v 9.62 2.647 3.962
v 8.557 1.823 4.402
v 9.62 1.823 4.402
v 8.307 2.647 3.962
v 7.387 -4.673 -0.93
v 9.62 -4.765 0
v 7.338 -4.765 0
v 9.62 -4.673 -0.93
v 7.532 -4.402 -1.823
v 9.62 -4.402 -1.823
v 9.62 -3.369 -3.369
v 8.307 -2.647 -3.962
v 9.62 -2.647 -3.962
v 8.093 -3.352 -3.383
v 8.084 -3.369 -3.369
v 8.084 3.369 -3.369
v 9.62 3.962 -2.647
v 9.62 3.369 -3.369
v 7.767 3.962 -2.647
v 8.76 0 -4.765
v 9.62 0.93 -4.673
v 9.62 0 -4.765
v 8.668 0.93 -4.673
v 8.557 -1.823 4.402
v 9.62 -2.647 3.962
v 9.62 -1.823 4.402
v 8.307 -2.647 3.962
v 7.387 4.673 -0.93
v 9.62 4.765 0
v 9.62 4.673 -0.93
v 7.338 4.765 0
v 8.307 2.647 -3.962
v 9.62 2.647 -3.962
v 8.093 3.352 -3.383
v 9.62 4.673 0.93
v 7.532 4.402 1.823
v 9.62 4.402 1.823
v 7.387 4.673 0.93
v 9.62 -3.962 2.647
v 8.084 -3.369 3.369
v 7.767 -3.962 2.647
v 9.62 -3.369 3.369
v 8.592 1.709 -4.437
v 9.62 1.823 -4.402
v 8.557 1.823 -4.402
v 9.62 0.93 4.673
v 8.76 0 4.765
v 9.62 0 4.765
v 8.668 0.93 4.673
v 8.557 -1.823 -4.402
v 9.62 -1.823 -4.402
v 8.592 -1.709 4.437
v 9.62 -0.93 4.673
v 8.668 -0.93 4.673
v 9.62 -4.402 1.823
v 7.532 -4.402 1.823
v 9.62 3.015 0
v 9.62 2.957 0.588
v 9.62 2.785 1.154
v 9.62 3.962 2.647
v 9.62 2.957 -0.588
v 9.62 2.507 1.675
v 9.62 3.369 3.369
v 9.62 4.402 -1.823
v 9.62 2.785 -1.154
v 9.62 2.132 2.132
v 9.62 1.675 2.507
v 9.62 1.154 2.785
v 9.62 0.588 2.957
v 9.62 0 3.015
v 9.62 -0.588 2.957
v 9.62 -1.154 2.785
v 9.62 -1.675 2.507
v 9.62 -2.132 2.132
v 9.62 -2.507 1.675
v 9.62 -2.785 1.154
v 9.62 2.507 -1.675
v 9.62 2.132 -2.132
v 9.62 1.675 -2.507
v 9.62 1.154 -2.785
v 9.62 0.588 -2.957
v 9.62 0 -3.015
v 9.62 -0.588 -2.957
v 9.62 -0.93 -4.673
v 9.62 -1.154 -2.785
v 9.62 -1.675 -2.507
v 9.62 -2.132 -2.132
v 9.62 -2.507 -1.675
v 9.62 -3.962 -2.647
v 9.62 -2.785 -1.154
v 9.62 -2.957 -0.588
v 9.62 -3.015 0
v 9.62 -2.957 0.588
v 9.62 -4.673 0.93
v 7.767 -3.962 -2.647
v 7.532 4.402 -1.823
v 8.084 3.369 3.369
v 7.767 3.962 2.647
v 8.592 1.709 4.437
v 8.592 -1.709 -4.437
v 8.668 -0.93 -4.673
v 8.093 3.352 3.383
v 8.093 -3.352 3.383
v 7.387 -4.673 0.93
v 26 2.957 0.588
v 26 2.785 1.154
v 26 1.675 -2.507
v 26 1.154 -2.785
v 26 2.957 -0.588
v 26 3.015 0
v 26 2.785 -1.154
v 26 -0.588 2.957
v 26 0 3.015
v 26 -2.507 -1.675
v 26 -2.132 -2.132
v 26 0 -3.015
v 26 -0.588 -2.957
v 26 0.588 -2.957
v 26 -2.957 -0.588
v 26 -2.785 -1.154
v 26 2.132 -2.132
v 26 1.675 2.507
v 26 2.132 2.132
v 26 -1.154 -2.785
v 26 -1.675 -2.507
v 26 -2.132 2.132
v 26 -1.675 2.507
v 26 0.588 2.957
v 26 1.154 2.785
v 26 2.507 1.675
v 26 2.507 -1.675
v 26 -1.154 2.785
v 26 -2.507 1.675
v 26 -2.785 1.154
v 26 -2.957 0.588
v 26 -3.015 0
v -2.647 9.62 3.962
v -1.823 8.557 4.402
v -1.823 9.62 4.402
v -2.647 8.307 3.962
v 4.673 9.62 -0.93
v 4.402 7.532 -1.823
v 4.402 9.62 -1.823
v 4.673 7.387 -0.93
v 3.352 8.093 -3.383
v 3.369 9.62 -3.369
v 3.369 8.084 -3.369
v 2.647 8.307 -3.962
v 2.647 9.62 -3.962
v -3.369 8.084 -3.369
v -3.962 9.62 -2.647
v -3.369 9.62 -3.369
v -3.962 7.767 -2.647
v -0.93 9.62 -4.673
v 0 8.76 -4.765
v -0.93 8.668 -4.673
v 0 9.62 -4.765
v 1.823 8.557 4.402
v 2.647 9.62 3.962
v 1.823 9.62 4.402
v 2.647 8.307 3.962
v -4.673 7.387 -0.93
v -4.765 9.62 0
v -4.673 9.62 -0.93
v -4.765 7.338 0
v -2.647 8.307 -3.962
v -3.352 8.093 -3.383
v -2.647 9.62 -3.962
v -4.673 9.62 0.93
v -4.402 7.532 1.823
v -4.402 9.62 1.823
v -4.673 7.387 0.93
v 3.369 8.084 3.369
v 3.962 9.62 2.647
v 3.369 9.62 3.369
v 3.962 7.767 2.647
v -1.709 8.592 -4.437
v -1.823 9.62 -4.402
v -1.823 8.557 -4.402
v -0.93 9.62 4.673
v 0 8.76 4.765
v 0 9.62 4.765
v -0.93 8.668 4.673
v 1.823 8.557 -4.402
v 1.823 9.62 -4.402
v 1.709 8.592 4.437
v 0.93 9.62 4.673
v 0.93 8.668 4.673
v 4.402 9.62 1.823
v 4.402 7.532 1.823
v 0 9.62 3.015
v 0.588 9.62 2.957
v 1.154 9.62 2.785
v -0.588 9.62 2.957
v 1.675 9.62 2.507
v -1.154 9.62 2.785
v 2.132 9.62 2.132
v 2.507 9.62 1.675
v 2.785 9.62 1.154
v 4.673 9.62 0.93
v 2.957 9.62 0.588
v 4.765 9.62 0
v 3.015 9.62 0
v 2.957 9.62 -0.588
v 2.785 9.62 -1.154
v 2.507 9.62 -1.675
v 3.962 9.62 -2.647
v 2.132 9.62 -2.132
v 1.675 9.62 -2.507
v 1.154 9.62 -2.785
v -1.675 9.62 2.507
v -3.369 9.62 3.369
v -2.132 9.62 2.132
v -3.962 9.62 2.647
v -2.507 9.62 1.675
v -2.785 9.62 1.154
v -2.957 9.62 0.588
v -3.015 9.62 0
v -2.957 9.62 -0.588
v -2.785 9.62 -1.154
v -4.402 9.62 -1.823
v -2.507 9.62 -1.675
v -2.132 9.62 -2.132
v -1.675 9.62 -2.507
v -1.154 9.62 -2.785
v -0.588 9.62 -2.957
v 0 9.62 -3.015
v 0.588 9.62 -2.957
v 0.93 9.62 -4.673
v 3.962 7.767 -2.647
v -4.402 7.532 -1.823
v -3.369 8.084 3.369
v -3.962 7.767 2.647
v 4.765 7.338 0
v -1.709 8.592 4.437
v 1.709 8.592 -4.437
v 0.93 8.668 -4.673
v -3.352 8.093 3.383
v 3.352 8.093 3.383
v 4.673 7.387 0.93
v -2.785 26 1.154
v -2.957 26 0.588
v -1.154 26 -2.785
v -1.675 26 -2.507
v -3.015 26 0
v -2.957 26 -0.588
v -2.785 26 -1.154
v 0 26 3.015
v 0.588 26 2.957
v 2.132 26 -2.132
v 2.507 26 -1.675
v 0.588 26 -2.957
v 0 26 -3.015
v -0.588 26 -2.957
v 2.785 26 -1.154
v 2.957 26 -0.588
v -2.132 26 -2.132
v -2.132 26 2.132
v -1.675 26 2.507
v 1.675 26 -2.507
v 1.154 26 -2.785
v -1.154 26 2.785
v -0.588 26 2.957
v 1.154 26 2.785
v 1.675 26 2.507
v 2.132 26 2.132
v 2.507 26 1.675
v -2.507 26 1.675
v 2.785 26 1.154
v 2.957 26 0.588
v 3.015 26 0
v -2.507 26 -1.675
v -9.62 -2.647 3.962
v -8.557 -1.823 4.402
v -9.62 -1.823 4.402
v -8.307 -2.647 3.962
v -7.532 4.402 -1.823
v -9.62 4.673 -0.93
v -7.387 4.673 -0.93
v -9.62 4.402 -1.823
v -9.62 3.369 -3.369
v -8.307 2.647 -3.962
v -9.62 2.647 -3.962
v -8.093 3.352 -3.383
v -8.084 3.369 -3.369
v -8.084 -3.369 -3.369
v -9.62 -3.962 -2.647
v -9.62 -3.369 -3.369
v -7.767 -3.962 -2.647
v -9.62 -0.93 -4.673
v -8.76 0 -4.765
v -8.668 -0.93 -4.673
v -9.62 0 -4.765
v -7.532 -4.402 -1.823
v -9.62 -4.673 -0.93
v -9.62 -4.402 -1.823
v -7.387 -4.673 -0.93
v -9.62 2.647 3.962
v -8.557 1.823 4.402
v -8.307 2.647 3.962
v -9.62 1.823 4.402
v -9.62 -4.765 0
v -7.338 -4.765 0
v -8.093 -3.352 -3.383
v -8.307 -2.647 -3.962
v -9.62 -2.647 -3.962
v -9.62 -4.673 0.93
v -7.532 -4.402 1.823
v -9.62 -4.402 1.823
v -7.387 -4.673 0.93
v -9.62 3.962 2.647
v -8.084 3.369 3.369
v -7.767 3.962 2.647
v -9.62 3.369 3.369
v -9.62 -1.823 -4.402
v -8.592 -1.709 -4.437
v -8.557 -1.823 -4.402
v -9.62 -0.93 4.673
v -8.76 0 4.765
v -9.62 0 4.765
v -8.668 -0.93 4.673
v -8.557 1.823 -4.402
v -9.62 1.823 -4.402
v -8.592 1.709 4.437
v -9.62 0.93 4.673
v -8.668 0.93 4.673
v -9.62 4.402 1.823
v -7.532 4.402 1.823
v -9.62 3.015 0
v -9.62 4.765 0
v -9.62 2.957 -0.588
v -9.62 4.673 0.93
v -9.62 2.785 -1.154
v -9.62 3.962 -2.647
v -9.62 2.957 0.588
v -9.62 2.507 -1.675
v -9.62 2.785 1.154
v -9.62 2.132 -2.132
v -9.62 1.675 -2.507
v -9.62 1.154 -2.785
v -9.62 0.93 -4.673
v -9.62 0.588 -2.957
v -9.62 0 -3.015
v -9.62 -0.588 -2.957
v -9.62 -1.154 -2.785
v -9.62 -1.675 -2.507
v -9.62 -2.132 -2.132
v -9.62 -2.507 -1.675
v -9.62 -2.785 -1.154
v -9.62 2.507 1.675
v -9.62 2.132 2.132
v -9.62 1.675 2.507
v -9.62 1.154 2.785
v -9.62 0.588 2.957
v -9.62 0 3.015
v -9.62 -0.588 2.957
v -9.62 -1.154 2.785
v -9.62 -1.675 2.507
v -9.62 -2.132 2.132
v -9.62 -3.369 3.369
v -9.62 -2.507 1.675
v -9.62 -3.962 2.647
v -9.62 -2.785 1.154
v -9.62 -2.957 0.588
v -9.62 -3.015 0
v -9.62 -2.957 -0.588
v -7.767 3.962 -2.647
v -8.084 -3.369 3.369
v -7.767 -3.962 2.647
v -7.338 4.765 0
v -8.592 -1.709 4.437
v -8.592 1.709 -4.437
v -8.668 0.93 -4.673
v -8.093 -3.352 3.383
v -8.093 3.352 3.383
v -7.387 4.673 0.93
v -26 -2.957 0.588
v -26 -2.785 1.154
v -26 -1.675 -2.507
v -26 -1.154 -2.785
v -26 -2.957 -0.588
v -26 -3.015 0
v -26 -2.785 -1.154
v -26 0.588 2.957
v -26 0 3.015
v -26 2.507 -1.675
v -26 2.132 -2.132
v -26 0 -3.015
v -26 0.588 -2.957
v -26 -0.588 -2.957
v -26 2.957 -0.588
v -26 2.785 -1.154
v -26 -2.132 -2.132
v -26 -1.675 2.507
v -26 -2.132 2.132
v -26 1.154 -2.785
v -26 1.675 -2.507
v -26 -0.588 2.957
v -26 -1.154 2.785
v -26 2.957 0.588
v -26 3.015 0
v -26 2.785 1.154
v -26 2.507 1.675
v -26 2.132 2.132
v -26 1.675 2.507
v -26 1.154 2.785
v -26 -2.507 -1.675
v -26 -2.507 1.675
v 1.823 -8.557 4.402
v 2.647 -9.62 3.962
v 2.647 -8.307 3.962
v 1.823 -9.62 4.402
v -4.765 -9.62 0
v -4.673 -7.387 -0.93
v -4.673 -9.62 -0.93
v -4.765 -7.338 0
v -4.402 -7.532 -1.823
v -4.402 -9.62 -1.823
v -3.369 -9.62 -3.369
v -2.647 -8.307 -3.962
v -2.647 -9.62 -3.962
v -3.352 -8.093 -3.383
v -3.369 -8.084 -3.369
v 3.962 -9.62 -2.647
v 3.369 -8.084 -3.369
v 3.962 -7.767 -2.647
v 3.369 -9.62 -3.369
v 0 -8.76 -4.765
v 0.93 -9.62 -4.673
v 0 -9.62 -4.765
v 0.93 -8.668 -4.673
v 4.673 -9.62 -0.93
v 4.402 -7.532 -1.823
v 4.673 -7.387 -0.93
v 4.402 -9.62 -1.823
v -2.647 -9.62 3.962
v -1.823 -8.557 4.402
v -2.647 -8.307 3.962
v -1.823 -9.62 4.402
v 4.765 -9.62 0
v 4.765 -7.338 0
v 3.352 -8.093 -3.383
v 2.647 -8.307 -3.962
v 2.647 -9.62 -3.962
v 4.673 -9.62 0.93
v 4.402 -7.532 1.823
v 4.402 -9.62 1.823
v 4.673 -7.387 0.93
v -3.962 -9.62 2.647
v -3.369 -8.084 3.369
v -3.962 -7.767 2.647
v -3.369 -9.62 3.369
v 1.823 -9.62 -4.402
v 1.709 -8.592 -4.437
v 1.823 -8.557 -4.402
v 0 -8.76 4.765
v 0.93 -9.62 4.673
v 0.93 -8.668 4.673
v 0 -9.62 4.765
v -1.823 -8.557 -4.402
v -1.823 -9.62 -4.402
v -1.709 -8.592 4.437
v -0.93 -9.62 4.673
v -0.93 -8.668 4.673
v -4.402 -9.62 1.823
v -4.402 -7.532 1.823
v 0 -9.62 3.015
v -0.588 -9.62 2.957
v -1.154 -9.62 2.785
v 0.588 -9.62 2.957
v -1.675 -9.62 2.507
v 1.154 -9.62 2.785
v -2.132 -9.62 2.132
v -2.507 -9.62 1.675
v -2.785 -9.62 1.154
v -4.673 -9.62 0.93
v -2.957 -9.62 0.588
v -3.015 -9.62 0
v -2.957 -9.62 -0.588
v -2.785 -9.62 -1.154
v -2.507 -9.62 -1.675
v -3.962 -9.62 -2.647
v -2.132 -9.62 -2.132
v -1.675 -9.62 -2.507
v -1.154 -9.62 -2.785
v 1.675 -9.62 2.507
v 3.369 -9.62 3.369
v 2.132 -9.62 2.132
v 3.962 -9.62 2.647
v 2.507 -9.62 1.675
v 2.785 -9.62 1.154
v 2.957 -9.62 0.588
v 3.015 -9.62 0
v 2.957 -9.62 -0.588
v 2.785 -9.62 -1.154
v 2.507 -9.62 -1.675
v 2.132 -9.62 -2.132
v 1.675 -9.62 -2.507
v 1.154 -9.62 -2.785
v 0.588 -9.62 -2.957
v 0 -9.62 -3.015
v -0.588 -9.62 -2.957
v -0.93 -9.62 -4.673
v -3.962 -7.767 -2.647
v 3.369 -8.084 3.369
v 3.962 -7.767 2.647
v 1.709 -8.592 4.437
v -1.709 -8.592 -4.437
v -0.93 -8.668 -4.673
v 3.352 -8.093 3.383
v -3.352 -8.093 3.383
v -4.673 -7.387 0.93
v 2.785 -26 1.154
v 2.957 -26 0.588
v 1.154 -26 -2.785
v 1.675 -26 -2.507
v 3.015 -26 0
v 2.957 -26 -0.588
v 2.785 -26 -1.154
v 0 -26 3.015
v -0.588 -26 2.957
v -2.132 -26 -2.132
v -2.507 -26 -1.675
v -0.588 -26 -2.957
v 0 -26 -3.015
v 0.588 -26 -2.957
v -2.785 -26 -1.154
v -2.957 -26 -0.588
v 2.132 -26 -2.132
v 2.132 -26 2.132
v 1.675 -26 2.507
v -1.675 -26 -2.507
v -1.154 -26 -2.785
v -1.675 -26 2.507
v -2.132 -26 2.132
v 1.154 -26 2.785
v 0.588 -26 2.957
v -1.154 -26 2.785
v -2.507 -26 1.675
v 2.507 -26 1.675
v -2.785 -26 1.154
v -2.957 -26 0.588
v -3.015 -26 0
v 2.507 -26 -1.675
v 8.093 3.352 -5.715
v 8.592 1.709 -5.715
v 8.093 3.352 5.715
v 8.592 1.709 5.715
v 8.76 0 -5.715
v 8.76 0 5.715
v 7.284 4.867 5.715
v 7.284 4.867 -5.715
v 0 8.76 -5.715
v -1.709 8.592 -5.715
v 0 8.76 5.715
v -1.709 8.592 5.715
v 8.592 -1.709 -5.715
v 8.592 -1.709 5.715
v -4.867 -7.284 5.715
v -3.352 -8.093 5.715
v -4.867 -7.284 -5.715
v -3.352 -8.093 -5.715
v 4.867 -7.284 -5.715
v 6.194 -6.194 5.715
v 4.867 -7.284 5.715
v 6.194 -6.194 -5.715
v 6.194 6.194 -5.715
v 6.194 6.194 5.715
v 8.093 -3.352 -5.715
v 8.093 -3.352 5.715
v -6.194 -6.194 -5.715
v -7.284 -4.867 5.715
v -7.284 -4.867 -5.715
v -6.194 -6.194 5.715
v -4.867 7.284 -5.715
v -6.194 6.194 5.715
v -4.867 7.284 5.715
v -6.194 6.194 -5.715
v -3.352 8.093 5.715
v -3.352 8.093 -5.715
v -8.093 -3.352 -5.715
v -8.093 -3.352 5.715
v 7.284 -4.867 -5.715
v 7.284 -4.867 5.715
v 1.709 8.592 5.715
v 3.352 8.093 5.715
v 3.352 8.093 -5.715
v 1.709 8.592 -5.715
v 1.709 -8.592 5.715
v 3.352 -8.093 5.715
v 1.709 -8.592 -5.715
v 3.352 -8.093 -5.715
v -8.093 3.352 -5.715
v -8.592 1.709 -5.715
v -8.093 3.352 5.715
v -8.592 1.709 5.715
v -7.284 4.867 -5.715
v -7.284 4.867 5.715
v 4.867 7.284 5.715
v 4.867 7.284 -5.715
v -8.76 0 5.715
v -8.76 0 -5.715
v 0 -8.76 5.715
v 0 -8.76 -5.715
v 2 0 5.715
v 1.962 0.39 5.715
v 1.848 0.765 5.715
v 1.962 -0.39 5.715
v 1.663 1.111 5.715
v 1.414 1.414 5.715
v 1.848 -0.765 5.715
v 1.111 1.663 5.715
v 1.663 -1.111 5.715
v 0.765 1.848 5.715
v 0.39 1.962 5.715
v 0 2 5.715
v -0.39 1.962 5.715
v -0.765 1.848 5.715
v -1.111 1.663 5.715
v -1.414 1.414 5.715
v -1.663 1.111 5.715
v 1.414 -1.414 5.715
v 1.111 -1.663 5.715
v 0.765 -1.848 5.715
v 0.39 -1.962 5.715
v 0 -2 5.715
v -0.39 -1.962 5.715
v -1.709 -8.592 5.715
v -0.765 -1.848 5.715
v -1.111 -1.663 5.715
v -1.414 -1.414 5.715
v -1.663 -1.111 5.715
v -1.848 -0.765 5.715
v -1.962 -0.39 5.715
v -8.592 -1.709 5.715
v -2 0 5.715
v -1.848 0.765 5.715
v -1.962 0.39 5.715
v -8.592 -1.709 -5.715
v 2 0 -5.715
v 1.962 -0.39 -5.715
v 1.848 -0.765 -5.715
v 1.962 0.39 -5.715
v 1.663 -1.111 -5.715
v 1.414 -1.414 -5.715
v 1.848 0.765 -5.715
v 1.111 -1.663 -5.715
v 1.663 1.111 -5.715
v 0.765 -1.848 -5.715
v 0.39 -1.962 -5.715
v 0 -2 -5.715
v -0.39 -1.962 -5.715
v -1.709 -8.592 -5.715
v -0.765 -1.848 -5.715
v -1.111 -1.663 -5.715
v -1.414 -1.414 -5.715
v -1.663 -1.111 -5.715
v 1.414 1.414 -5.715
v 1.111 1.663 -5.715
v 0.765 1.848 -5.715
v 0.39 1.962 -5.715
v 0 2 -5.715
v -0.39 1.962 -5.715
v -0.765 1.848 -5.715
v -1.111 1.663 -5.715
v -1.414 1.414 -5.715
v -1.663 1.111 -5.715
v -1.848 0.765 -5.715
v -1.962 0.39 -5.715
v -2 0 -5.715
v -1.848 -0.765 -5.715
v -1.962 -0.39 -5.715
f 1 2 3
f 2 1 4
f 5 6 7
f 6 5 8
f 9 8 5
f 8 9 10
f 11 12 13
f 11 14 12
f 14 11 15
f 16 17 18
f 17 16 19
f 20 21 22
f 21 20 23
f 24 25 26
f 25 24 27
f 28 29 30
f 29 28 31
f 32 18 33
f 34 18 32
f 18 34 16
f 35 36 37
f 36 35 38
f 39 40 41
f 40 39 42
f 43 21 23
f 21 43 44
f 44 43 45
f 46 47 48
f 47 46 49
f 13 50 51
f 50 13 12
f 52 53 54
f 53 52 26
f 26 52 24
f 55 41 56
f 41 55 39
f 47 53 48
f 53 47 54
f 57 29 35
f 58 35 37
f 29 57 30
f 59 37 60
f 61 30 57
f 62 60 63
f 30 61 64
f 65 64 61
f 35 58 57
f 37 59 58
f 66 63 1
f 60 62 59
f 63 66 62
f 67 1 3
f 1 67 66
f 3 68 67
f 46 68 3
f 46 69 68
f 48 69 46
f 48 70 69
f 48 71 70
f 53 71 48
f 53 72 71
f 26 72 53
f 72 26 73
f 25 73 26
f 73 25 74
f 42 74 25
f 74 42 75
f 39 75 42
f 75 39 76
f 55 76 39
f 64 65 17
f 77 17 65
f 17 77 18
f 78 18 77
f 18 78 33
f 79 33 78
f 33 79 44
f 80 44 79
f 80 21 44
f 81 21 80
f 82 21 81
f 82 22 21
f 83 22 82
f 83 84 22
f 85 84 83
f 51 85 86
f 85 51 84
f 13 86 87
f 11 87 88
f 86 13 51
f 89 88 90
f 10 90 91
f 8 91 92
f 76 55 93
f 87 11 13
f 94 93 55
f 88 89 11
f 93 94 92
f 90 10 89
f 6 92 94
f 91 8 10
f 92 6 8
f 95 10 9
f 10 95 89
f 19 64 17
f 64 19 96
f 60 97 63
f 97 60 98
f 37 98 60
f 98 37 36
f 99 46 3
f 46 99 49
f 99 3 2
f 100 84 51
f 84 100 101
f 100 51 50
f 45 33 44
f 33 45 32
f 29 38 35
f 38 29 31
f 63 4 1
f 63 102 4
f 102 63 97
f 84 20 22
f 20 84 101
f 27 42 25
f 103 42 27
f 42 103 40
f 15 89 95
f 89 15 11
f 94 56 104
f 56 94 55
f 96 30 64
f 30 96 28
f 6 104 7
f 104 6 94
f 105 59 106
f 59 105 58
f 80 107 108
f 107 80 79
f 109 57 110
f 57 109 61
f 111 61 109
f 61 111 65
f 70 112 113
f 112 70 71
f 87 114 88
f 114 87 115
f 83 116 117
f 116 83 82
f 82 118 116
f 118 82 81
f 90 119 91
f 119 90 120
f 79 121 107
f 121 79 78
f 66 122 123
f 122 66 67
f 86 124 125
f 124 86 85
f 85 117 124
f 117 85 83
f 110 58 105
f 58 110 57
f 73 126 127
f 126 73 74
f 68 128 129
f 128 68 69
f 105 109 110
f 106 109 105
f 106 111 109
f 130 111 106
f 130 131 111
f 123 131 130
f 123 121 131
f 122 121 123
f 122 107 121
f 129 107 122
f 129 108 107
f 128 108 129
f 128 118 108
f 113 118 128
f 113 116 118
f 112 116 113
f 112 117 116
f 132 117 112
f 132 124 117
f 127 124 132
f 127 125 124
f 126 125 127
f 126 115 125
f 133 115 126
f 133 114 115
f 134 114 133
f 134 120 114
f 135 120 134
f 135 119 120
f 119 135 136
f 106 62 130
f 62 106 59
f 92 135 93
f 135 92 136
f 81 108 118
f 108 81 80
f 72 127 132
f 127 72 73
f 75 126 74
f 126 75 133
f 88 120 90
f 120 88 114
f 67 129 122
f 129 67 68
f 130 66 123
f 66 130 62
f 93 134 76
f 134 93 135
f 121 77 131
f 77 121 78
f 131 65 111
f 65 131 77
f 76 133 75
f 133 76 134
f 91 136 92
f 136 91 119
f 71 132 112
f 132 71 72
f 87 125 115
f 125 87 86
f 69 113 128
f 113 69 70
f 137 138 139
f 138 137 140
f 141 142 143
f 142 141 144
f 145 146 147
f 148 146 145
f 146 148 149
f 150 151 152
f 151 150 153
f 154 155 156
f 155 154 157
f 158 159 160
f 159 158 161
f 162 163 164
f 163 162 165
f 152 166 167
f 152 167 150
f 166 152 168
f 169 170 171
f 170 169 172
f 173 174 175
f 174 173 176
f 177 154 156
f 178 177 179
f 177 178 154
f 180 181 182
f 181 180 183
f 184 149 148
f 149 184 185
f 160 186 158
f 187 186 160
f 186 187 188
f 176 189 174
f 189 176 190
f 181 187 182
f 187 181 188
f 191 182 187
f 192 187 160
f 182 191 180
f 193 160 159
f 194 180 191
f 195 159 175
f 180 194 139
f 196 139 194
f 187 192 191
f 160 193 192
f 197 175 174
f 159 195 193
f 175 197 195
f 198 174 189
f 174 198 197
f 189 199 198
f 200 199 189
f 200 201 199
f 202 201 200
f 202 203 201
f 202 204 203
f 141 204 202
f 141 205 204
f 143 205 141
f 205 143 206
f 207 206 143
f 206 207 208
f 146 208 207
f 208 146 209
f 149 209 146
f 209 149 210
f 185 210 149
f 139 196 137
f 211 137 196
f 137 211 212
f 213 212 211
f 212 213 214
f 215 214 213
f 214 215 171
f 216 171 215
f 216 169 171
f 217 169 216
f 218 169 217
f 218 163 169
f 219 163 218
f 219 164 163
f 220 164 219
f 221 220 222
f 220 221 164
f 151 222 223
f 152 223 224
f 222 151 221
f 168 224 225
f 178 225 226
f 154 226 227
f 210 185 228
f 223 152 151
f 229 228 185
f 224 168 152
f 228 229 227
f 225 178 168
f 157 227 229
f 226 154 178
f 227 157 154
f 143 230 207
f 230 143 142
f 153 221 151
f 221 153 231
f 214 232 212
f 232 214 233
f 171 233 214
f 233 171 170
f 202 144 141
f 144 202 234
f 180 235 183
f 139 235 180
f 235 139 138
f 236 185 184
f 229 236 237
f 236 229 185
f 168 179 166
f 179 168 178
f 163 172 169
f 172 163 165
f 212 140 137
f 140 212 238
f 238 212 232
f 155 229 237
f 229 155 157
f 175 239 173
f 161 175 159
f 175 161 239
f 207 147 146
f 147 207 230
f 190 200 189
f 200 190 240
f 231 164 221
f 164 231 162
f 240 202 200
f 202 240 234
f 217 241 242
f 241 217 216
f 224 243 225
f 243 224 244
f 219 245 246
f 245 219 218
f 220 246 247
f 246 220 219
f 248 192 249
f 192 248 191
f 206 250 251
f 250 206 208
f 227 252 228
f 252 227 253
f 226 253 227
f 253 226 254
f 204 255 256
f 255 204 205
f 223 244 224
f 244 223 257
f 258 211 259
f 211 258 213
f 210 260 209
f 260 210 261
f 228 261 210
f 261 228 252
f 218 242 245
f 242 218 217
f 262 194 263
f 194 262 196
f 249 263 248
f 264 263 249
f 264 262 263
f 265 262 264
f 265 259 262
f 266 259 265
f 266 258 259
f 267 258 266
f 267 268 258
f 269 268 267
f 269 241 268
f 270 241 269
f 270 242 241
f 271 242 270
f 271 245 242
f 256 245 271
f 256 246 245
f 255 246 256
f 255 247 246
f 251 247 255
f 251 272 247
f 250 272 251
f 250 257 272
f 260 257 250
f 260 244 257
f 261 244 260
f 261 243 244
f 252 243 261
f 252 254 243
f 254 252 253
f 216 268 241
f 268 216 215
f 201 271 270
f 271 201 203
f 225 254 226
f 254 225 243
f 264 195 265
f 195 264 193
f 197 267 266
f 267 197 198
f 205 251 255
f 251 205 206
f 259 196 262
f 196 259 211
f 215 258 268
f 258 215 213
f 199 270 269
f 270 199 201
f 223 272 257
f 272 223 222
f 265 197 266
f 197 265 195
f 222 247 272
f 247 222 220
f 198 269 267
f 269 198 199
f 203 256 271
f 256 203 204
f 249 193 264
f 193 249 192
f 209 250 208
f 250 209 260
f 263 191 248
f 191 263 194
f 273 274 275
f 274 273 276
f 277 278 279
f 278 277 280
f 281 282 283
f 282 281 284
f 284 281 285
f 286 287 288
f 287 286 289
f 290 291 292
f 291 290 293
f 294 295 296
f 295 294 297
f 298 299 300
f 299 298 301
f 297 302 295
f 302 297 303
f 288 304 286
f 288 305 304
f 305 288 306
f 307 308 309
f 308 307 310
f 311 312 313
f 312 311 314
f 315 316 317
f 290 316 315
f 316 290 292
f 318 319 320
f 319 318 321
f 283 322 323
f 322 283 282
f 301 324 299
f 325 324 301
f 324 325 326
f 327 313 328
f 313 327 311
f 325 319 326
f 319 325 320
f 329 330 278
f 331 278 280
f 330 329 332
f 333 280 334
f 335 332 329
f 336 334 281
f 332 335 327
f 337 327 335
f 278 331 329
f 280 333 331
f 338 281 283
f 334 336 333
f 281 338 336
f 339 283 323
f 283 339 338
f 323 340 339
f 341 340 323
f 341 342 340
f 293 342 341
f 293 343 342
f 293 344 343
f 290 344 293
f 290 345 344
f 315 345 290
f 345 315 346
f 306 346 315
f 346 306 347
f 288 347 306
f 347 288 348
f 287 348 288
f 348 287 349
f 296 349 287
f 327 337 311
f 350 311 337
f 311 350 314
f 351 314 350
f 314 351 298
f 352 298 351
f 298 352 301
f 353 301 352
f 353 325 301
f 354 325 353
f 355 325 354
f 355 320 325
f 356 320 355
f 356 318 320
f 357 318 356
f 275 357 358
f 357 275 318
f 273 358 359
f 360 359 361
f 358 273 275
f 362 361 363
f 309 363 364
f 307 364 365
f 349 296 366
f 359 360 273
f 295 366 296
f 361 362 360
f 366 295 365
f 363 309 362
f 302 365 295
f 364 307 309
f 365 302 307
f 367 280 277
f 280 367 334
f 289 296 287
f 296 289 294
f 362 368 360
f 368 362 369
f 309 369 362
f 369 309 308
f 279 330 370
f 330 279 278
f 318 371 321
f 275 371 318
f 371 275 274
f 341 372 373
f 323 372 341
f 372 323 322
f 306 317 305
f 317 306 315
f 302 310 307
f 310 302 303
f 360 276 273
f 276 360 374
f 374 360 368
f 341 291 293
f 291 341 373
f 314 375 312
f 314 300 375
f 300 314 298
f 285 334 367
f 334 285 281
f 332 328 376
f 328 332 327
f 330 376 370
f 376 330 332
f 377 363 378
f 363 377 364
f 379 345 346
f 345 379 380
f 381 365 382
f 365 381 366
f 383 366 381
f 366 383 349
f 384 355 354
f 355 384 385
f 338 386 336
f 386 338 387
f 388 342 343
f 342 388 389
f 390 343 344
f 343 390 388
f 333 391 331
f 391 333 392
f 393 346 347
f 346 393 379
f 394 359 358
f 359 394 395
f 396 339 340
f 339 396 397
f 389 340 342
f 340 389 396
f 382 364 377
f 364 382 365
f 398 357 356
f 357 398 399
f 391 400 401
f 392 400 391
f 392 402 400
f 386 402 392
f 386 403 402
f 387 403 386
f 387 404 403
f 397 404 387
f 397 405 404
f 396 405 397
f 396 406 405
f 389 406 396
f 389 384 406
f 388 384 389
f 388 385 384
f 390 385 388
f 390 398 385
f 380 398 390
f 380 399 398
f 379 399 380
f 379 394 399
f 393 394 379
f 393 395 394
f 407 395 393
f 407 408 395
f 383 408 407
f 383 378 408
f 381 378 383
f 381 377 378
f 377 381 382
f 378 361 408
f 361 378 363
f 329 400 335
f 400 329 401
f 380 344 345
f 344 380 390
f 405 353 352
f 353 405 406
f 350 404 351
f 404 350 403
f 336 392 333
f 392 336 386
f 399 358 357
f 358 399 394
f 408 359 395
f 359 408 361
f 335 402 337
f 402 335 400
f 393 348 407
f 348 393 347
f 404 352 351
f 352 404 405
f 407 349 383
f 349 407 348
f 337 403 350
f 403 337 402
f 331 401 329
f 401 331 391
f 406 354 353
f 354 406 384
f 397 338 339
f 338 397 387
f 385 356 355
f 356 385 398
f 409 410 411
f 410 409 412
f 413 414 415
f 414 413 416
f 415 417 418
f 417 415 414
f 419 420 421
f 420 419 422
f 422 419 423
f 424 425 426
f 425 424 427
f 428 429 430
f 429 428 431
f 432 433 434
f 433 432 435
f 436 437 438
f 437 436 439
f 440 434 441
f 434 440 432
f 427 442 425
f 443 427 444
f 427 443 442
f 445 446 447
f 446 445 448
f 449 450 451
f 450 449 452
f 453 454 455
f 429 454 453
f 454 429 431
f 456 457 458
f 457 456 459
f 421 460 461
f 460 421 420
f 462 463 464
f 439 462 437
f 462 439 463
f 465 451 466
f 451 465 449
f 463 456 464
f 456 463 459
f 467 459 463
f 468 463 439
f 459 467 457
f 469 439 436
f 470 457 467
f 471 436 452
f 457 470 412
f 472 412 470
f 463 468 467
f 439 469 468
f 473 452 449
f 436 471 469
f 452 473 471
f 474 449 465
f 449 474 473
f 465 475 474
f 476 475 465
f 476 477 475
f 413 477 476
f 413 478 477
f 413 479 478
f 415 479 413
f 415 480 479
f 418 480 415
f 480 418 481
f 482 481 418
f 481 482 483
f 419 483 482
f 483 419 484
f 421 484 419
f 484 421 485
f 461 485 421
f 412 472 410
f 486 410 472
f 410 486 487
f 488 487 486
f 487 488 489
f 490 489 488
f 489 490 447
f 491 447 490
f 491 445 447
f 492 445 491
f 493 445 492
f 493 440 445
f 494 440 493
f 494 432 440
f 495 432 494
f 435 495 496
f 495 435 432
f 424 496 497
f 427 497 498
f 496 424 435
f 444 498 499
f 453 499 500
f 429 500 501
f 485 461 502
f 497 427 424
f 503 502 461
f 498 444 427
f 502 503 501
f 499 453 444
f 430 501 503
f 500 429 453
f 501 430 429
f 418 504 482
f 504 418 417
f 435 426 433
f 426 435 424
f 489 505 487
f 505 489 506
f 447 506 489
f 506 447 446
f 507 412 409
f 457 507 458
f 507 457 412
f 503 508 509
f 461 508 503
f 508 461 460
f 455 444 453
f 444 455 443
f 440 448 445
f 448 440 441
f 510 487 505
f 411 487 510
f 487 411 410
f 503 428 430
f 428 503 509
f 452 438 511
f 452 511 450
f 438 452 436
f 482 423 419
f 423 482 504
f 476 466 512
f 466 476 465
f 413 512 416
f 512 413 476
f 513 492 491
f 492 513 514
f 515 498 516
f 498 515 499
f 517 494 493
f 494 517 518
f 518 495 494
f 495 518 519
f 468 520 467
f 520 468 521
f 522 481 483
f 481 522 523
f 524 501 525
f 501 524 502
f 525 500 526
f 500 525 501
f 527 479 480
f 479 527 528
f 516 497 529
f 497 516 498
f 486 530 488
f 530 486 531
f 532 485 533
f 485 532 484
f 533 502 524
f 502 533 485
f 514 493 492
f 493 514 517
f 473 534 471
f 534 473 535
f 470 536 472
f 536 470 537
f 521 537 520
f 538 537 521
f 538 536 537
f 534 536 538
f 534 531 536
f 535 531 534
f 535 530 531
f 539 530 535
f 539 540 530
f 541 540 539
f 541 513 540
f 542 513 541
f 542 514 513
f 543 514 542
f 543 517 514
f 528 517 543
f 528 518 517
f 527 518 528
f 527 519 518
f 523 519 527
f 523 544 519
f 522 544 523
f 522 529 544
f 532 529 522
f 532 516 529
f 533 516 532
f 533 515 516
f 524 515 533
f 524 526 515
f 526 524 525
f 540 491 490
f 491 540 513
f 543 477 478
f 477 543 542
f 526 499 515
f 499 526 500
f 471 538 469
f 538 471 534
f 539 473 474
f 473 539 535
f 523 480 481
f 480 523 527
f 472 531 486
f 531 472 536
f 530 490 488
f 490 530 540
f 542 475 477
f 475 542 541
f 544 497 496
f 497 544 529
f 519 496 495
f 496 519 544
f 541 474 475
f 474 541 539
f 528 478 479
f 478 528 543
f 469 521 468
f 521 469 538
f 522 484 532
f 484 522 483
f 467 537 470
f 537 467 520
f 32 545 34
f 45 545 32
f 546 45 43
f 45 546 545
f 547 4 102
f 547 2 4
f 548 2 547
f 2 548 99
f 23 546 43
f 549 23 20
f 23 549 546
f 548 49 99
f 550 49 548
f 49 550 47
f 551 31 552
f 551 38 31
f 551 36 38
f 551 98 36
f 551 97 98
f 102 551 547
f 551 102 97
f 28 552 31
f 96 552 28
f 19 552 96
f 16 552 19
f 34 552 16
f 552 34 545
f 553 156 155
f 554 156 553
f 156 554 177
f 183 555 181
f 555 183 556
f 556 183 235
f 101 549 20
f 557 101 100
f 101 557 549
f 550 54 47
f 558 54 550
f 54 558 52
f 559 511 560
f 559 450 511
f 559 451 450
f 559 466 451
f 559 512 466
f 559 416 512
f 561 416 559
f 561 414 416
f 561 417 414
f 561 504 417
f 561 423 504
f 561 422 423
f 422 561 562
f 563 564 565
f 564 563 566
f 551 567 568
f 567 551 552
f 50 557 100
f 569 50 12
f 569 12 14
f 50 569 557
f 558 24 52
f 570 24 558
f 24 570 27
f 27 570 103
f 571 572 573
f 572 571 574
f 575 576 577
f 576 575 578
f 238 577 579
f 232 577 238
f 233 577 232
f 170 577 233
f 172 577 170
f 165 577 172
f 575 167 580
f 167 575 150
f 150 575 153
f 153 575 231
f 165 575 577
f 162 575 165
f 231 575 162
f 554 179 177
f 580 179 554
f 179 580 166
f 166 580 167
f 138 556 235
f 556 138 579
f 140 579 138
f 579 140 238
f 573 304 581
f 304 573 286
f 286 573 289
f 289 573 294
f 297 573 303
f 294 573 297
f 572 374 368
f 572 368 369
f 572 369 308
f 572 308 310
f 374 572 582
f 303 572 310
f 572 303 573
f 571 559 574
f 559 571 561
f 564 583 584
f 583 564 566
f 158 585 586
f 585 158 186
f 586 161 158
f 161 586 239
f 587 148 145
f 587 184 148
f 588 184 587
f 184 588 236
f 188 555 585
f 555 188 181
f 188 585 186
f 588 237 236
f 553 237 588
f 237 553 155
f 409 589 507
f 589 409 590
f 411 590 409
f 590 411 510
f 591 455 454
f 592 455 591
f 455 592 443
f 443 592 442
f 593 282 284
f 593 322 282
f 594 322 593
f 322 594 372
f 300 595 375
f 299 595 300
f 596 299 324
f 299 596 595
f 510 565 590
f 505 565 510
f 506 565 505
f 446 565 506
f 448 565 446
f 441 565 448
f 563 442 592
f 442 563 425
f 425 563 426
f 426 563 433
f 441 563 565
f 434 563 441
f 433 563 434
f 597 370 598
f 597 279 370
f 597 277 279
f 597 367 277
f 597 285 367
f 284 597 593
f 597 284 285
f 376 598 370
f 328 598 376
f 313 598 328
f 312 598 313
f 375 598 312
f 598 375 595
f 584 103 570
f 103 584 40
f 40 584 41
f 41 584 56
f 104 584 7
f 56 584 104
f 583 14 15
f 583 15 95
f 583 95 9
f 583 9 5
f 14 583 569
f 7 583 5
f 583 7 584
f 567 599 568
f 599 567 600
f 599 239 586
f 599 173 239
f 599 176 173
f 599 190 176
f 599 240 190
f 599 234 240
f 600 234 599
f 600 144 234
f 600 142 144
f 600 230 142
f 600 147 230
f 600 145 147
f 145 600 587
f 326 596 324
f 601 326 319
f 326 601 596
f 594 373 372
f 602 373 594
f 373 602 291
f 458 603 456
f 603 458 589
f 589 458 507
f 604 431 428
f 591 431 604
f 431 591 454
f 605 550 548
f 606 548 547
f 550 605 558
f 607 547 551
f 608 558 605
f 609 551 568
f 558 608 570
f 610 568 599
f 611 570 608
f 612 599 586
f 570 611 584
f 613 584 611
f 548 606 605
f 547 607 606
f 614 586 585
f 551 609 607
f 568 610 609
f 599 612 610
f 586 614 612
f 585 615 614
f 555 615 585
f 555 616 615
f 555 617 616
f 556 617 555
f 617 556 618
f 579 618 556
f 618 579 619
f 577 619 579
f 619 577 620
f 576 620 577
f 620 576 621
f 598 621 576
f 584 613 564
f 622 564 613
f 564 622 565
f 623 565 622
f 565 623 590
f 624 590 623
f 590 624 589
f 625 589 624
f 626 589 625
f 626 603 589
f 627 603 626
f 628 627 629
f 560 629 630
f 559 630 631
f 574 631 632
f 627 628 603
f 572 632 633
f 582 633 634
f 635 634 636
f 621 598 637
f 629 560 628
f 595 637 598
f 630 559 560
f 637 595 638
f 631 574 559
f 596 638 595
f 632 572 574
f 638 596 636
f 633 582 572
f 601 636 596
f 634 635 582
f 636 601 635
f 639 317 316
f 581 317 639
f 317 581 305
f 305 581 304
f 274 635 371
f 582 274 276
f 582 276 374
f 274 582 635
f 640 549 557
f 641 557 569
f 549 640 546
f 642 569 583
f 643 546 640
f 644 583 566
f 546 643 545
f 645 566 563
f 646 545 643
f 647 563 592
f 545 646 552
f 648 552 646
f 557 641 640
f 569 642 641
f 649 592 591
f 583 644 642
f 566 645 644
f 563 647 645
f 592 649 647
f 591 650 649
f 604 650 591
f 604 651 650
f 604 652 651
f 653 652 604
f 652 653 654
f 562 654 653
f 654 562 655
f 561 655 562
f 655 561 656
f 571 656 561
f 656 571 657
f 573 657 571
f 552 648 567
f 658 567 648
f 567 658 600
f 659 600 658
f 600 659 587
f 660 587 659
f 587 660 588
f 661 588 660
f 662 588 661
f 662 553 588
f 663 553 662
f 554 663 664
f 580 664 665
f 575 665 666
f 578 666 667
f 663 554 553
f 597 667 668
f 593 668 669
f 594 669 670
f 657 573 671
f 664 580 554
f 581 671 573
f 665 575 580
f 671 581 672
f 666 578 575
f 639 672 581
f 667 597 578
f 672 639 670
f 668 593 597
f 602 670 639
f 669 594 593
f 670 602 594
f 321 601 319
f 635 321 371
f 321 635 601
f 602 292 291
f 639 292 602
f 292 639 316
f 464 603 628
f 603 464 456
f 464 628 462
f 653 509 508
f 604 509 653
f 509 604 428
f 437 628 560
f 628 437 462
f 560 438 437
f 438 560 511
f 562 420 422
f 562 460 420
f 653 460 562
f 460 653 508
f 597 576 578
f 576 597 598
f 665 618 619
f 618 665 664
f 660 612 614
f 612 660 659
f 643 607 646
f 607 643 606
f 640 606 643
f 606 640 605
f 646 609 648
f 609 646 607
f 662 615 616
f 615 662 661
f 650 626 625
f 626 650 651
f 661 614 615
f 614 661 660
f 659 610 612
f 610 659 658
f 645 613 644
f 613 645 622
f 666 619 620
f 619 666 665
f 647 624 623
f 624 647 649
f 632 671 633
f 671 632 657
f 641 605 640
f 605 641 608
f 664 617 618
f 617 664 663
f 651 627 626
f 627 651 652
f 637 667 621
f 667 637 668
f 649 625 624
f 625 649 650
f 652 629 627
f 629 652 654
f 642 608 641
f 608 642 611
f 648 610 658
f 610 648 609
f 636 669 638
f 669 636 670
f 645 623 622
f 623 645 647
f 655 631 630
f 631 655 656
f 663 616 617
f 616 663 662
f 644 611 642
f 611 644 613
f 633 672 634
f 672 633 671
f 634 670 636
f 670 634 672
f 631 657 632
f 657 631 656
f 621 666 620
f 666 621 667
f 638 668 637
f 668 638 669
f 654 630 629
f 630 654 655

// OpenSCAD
$fn = 32;

// ----------------------------------------------------------------------
// Cardan cross: 52 mm span, 9.53 mm trunnions
// ----------------------------------------------------------------------

// --- parameters (mm) ---
journal_d = 9.53;         // trunnion diameter
arm_len = 26;             // trunnion length from the centre
step_r = 3.24;            // step position from the centre
step_d = 6.03;            // journal diameter after the step
hub_d = 17.52;            // hub diameter
hub_h = 11.43;            // hub height
bore_d = 4;               // hub bore

difference() {
  union() {
    /* hub along the joint axis */
    cylinder(h = hub_h, d = hub_d, center = true);
    for (a = [0 : 90 : 270]) rotate([0, 0, a]) {
      /* trunnion, sunk into the hub */
      translate([hub_d / 4, 0, 0]) rotate([0, 90, 0]) cylinder(h = step_r + 2, d = journal_d);
      /* stepped journal out to the tip */
      translate([step_r - 0.5, 0, 0]) rotate([0, 90, 0]) cylinder(h = arm_len + 0.5 - step_r, d = step_d);
    }
  }
  /* lubrication bore through the hub, 2.5 mm clear on both sides */
  translate([0, 0, -hub_h / 2 - 2.5]) cylinder(h = hub_h + 5, d = bore_d);
}
